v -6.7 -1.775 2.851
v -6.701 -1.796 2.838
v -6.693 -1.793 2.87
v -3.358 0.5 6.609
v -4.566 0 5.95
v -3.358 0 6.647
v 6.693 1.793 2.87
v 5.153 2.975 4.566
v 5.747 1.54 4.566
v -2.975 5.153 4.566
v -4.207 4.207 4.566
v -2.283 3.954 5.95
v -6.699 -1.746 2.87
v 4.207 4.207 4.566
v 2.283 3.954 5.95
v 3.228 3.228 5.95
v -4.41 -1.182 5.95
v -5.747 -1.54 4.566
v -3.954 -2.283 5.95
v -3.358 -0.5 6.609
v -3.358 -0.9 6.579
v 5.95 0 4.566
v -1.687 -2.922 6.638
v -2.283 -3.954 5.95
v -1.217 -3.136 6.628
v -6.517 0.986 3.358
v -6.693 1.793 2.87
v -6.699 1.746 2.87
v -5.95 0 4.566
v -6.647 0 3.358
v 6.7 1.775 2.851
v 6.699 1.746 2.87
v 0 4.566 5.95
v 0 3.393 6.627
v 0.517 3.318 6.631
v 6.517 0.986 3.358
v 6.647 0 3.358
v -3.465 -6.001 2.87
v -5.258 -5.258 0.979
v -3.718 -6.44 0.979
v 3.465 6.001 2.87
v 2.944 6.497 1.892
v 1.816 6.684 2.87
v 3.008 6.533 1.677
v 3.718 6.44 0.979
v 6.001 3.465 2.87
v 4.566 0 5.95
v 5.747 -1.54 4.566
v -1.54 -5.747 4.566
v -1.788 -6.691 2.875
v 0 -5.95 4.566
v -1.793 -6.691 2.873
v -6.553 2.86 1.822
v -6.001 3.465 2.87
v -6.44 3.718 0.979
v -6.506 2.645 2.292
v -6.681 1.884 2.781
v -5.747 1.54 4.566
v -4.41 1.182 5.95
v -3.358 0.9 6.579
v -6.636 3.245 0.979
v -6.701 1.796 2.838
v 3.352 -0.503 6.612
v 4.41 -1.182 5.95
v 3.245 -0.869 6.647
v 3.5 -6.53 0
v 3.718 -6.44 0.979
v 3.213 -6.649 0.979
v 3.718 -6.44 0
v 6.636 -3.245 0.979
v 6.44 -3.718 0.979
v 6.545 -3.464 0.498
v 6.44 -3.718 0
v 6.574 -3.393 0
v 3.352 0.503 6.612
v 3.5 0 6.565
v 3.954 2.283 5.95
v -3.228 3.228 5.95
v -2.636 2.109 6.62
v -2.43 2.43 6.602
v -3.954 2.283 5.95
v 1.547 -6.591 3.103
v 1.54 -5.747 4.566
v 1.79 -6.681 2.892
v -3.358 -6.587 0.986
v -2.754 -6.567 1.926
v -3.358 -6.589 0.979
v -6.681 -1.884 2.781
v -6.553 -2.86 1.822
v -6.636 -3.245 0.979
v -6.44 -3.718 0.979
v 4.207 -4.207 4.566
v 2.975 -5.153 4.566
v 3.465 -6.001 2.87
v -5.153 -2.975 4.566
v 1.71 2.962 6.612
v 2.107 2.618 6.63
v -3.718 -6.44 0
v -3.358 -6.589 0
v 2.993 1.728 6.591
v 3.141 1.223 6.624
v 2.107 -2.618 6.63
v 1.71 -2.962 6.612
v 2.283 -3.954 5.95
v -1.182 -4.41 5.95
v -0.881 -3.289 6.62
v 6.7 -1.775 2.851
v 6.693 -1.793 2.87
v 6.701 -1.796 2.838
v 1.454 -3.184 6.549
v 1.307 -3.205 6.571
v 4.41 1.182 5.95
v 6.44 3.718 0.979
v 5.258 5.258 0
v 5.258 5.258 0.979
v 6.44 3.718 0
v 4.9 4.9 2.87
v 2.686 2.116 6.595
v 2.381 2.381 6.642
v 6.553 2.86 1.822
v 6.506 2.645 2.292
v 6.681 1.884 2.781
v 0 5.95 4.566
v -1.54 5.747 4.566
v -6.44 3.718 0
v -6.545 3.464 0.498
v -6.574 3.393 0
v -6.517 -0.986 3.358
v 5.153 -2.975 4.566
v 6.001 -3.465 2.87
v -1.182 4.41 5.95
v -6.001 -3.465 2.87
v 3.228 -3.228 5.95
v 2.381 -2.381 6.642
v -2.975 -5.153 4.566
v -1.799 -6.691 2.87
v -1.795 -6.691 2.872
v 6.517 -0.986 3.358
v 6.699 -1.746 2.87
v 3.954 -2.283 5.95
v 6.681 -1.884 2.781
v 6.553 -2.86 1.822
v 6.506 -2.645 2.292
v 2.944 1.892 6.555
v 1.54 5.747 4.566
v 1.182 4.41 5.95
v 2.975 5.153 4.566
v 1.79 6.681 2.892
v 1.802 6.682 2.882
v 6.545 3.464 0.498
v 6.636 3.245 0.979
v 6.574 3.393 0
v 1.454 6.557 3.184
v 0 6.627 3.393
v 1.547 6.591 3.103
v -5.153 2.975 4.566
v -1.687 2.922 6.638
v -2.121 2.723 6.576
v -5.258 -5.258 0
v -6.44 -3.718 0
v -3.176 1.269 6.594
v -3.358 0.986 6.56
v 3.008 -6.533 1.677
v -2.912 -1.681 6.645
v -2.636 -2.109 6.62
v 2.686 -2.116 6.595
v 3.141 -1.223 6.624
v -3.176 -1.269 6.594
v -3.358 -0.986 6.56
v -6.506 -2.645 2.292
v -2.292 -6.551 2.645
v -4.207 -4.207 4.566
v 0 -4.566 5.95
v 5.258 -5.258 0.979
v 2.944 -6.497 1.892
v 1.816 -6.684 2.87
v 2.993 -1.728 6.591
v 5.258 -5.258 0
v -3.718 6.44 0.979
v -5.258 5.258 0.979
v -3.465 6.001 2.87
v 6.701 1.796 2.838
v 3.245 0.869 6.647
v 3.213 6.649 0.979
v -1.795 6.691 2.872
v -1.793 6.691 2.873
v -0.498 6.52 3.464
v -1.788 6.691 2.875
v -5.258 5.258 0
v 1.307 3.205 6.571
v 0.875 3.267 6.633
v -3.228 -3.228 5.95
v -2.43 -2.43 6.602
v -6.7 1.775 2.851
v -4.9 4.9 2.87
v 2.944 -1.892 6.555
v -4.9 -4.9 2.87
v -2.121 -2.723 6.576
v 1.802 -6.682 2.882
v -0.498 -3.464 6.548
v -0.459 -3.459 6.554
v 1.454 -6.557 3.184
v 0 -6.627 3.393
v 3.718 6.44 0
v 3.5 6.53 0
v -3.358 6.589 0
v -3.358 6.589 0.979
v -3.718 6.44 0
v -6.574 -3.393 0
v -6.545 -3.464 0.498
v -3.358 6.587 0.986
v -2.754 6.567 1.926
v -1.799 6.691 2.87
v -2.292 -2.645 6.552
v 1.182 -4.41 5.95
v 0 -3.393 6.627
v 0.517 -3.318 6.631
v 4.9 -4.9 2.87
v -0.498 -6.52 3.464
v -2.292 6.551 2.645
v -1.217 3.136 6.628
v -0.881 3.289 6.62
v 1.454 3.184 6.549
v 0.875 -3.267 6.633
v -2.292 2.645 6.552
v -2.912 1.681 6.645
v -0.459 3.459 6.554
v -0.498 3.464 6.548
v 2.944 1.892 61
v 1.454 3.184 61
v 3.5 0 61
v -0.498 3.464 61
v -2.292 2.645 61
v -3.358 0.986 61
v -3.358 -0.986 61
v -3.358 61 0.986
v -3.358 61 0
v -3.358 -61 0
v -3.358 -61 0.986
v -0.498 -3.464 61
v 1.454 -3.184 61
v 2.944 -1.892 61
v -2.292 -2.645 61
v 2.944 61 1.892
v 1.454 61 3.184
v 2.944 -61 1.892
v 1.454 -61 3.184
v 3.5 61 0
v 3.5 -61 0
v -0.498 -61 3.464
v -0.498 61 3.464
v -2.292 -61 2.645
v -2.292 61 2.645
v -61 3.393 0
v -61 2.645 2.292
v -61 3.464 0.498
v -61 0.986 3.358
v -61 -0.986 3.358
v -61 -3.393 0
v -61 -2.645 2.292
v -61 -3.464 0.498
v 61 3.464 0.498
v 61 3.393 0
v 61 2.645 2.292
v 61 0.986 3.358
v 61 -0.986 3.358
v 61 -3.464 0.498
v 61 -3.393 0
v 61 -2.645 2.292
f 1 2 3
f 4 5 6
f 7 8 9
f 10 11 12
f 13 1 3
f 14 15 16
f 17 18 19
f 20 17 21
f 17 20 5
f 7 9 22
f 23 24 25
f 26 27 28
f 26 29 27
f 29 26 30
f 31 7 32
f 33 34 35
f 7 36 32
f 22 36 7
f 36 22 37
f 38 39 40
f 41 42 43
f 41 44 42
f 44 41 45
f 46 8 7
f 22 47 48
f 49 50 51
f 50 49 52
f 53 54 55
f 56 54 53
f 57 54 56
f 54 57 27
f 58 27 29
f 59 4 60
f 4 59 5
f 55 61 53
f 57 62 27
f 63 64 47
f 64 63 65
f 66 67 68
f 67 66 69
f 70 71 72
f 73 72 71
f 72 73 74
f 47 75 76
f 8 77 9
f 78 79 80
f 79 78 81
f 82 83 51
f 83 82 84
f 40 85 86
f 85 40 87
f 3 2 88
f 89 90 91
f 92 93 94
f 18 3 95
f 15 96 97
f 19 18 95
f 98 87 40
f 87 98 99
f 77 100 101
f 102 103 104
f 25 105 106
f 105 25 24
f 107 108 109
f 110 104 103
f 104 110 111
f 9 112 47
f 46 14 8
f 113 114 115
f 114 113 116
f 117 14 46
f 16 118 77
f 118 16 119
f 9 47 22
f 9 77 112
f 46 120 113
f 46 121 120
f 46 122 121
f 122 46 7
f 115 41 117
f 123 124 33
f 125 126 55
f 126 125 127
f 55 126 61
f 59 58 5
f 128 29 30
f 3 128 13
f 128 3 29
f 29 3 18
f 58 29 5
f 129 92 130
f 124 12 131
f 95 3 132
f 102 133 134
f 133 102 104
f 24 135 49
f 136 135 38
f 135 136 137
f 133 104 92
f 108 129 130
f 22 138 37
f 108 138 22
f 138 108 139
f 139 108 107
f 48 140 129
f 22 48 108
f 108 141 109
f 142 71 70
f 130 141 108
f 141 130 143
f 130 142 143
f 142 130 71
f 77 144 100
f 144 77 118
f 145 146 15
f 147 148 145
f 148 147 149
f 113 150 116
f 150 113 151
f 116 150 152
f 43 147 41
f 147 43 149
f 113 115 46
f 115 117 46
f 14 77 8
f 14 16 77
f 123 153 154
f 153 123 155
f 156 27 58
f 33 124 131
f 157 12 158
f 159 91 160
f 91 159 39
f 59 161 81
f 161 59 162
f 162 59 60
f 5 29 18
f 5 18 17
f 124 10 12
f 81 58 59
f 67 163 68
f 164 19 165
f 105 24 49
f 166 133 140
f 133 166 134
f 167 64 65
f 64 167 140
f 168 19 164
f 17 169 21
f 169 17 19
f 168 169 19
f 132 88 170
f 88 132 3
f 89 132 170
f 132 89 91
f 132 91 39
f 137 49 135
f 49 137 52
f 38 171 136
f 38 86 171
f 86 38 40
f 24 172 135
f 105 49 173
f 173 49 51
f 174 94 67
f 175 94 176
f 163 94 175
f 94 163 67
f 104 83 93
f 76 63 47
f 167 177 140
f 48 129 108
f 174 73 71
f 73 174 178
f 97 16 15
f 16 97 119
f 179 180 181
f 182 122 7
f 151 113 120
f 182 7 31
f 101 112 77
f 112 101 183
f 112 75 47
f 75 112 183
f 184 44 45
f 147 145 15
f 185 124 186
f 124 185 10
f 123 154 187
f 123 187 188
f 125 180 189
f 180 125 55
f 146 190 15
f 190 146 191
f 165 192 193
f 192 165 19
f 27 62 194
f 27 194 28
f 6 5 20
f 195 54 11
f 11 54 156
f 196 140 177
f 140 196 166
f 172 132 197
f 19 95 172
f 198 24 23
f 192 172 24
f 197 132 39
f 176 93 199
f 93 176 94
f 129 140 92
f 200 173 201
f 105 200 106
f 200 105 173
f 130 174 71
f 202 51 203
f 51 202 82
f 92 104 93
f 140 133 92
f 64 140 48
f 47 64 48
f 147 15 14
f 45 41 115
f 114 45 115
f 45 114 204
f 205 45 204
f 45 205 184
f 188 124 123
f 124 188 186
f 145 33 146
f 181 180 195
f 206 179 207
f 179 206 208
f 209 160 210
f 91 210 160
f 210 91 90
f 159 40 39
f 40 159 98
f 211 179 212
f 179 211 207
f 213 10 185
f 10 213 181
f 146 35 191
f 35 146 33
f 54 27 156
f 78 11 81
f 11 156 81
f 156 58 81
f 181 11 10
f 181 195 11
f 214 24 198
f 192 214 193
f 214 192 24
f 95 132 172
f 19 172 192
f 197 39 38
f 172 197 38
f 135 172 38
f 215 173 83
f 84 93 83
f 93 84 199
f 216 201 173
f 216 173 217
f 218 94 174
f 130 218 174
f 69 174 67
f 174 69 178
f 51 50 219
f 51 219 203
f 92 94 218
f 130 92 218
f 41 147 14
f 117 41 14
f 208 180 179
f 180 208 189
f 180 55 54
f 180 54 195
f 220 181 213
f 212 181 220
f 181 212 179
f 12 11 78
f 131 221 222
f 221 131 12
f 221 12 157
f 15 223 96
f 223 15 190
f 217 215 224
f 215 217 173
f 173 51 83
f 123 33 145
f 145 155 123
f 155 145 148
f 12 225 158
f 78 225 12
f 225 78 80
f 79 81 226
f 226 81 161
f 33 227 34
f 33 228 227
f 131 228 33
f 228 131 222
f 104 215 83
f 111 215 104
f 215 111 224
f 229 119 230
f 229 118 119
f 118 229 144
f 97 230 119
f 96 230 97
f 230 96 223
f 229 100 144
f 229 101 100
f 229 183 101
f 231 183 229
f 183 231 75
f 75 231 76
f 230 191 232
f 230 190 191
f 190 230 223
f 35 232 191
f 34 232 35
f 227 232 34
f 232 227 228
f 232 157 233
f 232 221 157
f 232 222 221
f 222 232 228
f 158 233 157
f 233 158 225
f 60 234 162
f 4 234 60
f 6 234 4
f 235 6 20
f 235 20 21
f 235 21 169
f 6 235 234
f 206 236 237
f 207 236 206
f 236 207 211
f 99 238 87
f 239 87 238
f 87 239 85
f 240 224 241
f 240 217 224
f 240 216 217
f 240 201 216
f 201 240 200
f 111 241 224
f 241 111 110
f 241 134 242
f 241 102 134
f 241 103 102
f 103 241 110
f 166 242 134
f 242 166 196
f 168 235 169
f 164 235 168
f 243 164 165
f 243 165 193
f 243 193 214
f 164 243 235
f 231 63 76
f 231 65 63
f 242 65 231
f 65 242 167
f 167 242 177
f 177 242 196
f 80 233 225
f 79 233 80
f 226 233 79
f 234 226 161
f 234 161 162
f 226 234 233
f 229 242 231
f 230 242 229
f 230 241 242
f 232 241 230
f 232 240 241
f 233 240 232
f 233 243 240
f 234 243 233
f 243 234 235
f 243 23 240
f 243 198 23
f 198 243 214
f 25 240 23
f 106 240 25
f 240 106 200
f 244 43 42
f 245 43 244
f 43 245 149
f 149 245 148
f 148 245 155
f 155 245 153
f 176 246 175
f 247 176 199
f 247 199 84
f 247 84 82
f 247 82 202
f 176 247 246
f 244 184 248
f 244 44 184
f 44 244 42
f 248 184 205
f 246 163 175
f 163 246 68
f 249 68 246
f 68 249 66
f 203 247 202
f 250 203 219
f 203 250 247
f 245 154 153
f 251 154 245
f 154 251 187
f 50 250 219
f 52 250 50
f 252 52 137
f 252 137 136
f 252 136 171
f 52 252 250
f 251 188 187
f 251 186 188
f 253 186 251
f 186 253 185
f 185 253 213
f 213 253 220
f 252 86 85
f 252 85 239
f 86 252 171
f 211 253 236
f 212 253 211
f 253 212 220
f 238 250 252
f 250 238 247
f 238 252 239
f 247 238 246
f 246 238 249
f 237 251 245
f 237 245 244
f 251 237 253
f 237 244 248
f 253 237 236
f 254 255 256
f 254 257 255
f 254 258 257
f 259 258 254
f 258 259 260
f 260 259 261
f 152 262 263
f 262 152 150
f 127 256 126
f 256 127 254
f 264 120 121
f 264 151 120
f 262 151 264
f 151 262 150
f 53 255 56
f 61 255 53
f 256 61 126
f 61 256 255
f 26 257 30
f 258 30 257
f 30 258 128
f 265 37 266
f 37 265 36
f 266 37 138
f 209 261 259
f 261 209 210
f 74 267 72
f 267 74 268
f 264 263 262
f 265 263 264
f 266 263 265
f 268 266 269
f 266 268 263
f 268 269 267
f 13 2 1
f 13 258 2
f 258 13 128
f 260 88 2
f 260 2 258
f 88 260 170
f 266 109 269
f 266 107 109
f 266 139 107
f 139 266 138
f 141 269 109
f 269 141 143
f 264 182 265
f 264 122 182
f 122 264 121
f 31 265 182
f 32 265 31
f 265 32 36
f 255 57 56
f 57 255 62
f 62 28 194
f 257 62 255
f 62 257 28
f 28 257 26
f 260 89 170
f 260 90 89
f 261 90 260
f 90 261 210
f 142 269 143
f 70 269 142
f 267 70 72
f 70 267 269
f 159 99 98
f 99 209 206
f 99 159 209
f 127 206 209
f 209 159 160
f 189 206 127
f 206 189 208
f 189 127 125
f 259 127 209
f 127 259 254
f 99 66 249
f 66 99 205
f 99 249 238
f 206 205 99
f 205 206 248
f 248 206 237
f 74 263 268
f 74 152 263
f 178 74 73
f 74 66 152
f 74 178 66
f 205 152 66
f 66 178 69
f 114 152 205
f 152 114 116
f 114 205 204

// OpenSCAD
difference(){
    union(){
        sphere(7.5);
        cylinder(h=122 , r = 3.5, center = true);
        rotate([90,0,0]){
            cylinder(h=122 , r = 3.5, center = true);
        }
        rotate([0,90,0]){
            cylinder(h=122 , r = 3.5, center = true);
        }
    }
    translate([0, 0, -61.5]){
        cube([123, 123, 123],true);
    }
}
